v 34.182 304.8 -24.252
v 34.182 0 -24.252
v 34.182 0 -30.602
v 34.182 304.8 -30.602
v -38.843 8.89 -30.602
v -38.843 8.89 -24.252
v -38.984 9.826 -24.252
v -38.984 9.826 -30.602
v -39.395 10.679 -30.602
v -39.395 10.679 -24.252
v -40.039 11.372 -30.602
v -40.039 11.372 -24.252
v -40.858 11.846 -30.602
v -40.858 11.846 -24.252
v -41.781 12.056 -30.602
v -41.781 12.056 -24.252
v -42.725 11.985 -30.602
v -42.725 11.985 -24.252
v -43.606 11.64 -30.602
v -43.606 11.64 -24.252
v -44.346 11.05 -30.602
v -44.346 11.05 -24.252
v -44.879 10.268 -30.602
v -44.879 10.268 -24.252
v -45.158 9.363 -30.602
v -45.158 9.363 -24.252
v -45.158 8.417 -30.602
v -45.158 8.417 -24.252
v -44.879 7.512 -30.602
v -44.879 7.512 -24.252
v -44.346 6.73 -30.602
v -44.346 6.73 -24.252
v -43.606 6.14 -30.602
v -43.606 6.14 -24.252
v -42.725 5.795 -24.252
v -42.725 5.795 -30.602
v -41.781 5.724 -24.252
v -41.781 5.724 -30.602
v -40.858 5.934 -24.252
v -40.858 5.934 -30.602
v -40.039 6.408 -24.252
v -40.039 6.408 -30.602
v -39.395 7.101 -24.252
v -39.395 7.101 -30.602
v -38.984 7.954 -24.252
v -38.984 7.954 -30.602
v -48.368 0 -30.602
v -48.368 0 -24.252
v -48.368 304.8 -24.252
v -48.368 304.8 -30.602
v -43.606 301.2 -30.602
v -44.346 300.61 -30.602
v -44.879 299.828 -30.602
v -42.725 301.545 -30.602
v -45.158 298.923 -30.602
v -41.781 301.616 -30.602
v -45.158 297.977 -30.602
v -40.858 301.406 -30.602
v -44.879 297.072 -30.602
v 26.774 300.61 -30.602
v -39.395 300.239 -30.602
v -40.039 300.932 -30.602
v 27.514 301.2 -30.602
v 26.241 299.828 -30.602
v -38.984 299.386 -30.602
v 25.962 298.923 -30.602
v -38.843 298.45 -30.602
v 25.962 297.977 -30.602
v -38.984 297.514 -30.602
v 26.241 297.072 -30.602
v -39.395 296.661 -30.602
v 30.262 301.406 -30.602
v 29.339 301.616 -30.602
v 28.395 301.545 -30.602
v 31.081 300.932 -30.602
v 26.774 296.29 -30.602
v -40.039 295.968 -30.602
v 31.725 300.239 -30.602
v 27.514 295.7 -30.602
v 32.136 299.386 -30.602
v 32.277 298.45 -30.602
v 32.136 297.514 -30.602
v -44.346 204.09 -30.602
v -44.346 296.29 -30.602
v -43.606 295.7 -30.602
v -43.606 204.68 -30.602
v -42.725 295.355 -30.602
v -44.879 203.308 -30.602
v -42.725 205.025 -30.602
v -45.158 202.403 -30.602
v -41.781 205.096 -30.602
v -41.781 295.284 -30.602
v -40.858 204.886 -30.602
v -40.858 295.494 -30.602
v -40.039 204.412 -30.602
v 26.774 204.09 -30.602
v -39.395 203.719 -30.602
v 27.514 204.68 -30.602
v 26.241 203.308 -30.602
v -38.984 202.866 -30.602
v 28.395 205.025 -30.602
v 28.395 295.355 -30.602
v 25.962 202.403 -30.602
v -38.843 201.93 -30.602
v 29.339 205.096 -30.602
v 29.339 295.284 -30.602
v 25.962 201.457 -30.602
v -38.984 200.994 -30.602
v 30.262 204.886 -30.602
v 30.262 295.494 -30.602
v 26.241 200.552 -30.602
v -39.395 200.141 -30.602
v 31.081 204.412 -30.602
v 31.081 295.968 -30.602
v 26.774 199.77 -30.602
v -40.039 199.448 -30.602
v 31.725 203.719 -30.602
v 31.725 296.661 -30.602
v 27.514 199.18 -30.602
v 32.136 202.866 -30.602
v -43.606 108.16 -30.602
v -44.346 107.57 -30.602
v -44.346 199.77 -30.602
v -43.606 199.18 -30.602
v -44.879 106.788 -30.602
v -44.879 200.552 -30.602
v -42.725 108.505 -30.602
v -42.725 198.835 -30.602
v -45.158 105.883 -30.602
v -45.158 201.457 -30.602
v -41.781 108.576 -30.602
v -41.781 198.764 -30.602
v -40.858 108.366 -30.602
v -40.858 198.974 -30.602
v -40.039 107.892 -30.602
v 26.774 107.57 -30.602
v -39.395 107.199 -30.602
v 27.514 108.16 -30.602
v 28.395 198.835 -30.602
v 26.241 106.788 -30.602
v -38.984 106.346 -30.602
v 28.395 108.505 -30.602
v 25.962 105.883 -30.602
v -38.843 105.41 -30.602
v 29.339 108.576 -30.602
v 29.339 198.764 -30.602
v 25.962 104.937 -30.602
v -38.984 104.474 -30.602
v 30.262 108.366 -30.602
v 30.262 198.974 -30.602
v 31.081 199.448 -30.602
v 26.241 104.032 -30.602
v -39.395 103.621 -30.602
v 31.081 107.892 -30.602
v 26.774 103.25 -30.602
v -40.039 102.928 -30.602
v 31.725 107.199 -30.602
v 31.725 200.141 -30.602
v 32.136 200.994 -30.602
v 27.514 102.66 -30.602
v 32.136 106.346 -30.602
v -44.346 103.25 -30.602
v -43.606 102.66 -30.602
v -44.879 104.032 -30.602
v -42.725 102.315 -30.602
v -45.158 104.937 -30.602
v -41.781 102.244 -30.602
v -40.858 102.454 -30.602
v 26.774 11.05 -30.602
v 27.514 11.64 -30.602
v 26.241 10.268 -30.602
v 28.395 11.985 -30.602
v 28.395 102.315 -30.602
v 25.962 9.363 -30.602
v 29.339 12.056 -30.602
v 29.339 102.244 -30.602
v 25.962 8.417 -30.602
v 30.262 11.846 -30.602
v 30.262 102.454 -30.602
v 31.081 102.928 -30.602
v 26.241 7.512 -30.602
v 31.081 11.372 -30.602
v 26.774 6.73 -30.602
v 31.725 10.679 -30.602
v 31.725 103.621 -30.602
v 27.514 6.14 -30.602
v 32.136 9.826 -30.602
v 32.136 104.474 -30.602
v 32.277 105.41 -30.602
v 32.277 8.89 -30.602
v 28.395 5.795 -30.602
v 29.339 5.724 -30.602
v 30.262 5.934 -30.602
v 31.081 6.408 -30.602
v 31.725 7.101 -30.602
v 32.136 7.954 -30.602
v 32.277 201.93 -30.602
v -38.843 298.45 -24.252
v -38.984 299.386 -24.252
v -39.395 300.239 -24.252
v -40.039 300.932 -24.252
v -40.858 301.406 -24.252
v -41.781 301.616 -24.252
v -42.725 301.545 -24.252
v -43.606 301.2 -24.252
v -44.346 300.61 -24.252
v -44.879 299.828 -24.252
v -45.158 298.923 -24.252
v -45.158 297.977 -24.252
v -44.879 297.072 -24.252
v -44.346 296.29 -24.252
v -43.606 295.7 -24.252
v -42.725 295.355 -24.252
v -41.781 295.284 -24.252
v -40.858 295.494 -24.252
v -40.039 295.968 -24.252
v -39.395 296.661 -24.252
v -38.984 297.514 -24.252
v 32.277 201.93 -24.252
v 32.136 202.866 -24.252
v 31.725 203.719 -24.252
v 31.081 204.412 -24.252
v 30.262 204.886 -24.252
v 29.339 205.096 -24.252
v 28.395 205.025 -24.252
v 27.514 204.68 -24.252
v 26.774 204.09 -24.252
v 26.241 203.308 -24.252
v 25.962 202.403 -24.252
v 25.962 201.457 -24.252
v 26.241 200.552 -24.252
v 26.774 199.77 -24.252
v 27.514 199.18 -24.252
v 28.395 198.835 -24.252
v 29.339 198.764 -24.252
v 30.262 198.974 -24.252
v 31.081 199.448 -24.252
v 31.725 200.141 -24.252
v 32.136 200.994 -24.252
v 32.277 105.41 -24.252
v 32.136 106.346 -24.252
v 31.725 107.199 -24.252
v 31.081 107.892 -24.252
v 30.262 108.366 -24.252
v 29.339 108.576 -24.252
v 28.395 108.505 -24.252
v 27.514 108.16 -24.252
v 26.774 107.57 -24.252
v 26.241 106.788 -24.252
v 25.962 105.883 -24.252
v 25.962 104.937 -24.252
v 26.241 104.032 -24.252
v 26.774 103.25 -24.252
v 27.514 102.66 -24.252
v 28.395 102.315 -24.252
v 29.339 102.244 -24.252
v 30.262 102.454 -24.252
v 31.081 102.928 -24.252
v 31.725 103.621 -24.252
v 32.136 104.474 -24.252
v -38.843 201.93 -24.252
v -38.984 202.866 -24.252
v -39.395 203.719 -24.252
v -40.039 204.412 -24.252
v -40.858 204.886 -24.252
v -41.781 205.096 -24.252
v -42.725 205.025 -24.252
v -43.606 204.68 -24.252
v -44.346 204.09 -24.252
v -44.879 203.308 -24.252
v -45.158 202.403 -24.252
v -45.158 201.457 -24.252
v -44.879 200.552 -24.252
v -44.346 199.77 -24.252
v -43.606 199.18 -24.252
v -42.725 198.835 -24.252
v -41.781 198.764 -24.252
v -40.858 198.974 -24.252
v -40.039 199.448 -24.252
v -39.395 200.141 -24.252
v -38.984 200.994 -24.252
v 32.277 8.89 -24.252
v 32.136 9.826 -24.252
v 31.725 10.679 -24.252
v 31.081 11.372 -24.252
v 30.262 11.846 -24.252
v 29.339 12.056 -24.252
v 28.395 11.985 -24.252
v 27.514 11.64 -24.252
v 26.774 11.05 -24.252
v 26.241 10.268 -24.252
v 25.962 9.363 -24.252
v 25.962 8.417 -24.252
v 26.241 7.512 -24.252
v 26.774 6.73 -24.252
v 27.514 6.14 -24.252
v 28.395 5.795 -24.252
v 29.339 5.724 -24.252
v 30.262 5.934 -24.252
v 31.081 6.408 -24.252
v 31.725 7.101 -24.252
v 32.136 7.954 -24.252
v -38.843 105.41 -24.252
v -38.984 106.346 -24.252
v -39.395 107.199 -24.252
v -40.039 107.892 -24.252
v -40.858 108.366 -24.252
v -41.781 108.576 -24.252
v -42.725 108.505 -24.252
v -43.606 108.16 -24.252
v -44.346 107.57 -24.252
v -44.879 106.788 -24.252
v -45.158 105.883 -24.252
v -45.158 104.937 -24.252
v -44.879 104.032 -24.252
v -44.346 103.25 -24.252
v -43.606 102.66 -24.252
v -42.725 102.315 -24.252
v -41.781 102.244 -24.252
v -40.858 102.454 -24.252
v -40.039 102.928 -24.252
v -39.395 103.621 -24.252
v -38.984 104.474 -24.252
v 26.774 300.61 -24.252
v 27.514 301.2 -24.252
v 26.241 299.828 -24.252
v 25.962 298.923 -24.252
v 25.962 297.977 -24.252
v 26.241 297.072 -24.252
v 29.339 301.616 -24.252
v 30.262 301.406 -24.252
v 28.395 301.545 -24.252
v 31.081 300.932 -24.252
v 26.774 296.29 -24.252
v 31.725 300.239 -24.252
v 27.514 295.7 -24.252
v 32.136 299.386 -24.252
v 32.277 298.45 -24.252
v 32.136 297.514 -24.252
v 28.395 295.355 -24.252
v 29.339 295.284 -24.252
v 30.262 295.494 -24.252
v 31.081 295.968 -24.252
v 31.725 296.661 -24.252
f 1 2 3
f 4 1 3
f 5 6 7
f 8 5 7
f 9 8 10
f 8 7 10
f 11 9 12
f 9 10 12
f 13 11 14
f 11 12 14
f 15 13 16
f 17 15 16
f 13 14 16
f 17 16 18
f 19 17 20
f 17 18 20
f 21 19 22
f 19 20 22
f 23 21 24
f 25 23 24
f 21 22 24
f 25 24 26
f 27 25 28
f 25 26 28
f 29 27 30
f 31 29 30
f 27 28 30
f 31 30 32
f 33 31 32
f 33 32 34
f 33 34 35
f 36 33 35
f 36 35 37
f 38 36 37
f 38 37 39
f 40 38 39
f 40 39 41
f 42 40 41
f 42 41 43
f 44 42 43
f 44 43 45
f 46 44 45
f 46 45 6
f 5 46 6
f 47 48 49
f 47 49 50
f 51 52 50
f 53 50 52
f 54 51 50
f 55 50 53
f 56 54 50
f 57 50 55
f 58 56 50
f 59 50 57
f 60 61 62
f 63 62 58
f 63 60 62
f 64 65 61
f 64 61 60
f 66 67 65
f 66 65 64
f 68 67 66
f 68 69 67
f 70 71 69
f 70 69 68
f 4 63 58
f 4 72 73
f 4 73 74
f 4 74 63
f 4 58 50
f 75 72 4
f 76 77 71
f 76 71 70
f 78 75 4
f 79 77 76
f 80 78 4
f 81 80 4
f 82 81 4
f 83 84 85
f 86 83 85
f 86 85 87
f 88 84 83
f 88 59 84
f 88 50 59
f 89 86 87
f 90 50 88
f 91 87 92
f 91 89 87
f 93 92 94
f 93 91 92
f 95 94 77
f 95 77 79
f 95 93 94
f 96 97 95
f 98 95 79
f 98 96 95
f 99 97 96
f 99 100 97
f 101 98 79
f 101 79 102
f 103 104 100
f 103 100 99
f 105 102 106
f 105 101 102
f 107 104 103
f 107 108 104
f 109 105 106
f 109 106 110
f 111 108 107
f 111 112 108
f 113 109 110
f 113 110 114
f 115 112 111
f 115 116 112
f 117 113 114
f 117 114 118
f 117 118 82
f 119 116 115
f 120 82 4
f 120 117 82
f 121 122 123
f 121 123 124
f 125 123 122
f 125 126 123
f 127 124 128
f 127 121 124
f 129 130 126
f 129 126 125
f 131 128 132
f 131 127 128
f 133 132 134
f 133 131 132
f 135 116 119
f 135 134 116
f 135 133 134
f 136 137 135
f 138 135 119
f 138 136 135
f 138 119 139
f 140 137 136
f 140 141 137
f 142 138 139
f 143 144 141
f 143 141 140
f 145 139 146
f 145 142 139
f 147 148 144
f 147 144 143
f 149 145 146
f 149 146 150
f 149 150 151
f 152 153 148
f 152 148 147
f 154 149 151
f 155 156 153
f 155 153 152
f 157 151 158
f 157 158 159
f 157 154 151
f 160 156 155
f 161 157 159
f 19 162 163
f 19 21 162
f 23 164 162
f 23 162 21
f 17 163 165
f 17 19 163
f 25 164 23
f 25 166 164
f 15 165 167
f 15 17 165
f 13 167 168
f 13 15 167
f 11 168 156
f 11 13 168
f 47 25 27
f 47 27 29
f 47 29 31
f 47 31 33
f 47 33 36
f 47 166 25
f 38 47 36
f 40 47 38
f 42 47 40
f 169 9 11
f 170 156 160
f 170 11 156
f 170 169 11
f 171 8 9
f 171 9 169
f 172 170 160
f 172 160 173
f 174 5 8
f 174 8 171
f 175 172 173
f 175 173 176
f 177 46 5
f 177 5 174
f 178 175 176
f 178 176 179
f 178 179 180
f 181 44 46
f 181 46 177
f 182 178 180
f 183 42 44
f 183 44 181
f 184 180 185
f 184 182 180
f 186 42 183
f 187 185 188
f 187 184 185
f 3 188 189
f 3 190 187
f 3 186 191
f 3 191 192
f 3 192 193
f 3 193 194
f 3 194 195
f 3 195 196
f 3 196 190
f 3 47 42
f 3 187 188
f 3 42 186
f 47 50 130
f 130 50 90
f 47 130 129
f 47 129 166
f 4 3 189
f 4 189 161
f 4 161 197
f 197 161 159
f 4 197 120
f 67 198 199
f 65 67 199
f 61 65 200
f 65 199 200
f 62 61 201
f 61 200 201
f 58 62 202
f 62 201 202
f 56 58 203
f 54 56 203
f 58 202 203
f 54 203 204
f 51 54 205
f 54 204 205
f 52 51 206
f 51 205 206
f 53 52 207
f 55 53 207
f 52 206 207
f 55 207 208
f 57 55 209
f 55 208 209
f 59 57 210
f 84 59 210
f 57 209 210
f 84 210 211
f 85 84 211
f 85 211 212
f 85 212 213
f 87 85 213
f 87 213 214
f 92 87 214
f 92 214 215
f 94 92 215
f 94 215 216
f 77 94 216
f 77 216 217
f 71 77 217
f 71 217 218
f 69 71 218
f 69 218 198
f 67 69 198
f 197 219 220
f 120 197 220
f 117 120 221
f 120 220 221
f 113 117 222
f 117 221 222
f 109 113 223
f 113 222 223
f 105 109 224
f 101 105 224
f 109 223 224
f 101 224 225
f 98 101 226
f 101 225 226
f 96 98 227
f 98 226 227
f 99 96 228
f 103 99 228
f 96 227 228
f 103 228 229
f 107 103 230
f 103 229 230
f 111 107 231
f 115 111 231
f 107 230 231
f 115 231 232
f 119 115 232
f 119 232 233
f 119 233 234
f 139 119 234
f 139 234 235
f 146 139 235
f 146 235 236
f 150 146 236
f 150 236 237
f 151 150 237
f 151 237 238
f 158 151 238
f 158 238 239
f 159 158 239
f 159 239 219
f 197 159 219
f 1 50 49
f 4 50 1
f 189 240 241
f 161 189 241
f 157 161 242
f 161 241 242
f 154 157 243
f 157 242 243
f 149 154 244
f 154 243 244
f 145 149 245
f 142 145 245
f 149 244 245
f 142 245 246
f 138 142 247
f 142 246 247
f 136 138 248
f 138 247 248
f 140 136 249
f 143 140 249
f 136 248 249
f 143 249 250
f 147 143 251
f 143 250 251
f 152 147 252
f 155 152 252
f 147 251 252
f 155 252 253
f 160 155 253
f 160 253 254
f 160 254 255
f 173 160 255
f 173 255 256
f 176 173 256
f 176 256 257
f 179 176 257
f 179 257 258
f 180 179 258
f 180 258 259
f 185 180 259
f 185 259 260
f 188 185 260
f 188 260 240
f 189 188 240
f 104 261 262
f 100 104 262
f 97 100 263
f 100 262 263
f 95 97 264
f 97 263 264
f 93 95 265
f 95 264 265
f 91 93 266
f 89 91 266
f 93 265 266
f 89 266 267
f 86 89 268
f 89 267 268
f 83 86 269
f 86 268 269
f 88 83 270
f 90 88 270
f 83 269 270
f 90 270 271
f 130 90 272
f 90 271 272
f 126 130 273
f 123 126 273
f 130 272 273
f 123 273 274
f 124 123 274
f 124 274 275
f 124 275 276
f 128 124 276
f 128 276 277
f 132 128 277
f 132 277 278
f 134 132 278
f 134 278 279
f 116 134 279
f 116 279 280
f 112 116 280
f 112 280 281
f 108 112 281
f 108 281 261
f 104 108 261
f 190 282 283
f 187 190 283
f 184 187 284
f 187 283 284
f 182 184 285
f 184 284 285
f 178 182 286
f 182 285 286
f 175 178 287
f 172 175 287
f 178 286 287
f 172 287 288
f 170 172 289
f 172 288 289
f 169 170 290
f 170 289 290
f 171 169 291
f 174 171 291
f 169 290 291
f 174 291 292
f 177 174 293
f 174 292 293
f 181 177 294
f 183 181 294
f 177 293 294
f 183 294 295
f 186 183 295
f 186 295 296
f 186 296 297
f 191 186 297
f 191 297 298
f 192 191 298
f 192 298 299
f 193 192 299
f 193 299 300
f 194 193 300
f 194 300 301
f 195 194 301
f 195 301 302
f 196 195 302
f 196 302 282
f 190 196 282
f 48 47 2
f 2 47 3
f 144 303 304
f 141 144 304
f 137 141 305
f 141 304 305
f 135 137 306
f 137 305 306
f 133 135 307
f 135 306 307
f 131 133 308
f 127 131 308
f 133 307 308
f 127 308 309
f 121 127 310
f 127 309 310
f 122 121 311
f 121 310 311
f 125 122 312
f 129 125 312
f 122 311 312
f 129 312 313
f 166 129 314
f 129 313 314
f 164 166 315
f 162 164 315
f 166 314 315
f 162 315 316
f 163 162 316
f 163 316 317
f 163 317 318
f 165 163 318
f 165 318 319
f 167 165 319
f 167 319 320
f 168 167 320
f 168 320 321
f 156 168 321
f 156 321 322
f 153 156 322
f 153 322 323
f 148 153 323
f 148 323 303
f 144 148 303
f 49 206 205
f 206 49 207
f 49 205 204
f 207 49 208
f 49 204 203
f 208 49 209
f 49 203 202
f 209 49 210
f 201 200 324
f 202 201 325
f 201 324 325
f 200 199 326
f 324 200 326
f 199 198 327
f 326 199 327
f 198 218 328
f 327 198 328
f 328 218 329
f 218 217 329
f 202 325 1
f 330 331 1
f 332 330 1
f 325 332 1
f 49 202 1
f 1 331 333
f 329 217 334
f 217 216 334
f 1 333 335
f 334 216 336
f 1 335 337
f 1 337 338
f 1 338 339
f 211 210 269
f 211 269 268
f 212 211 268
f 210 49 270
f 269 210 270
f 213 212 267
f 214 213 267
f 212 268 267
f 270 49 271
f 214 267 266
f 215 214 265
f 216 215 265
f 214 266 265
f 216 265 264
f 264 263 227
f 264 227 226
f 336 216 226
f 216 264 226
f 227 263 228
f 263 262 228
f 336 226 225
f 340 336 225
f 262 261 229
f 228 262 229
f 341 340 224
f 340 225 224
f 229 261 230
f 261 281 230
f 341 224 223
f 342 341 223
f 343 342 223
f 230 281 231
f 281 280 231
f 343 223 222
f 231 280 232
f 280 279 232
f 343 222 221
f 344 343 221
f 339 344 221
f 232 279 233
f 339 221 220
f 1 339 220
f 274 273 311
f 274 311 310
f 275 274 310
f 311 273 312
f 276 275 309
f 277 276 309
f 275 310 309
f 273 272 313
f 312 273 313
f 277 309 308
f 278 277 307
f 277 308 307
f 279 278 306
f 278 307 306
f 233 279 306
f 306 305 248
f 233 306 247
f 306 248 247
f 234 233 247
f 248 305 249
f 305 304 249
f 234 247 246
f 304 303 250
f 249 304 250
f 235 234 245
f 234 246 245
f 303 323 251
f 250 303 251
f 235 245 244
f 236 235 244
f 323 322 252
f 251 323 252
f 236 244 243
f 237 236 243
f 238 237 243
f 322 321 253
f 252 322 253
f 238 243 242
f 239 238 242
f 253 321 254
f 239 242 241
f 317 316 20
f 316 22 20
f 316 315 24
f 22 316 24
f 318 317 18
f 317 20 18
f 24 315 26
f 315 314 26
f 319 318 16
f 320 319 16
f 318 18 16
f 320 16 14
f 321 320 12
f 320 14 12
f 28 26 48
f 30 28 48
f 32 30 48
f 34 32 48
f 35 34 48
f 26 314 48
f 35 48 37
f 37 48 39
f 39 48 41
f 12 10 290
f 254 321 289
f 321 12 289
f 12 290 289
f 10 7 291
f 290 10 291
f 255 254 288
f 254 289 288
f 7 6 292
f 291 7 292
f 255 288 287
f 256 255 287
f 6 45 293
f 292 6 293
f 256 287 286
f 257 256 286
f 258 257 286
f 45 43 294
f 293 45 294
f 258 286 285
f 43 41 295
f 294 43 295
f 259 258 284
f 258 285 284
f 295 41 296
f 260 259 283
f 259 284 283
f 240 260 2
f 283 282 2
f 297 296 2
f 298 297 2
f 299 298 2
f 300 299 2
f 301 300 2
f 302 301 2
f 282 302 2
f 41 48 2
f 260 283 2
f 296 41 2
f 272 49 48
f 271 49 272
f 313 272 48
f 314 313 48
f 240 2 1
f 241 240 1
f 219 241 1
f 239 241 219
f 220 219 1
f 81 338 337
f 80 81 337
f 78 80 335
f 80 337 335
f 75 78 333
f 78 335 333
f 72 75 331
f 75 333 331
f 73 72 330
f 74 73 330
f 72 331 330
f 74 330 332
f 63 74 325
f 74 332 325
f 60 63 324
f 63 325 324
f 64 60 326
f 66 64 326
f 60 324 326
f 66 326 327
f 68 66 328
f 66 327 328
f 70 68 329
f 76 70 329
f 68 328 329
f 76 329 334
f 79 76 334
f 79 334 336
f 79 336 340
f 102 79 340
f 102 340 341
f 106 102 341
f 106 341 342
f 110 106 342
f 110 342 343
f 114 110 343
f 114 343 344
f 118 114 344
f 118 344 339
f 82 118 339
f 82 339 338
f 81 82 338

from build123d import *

# Parameters (mm, degrees)
SKETCH1_W                 = 82.55
SKETCH1_H                 = 6.35
BOSS_EXTRUDE1_DEPTH       = 304.8
SKETCH2_R                 = 3.175
CUT_EXTRUDE1_DEPTH        = 152.4
LPATTERN1_COUNT           = 4
LPATTERN1_PITCH           = 96.52
LPATTERN2_COUNT           = 2
LPATTERN2_PITCH           = 71.12
LPATTERN2_COPY_1_SKETCH_R = 3.175
LPATTERN2_COPY_1_DEPTH    = 152.4
LPATTERN2_COPY_2_SKETCH_R = 3.175
LPATTERN2_COPY_2_DEPTH    = 152.4
LPATTERN2_COPY_3_SKETCH_R = 3.175
LPATTERN2_COPY_3_DEPTH    = 152.4


with BuildPart() as part:
    # Sketch1 → Boss-Extrude1 (new body)
    with BuildSketch(Plane(origin=(0, 0, 0), x_dir=(1, 0, 0), z_dir=(0, 1, 0))):
        with Locations((-7.093085106, 27.426595745)):
            Rectangle(SKETCH1_W, SKETCH1_H)
    extrude(amount=BOSS_EXTRUDE1_DEPTH)

    # Sketch2 → Cut-Extrude1 (cut)
    with BuildSketch(Plane.XY.offset(-24.251595745)):
        with Locations((-42.018085106, 298.45)):
            Circle(SKETCH2_R)
    cut_extrude1 = extrude(amount=-CUT_EXTRUDE1_DEPTH, mode=Mode.SUBTRACT)

    # LPattern1: Cut-Extrude1 ×4
    with Locations(*[(0, -i * LPATTERN1_PITCH, 0) for i in range(1, LPATTERN1_COUNT)]):
        add(cut_extrude1, mode=Mode.SUBTRACT)

    # LPattern2: Cut-Extrude1 ×2
    with Locations(*[(i * LPATTERN2_PITCH, 0, 0) for i in range(1, LPATTERN2_COUNT)]):
        add(cut_extrude1, mode=Mode.SUBTRACT)

    # LPattern2 copy 1 sketch → LPattern2 copy 1 (cut)
    with BuildSketch(Plane(origin=(71.12, -96.52, -24.251595745), x_dir=(1, 0, 0), z_dir=(0, 0, 1))):
        with Locations((-42.018085106, 298.45)):
            Circle(LPATTERN2_COPY_1_SKETCH_R)
    extrude(amount=-LPATTERN2_COPY_1_DEPTH, mode=Mode.SUBTRACT)

    # LPattern2 copy 2 sketch → LPattern2 copy 2 (cut)
    with BuildSketch(Plane(origin=(71.12, -193.04, -24.251595745), x_dir=(1, 0, 0), z_dir=(0, 0, 1))):
        with Locations((-42.018085106, 298.45)):
            Circle(LPATTERN2_COPY_2_SKETCH_R)
    extrude(amount=-LPATTERN2_COPY_2_DEPTH, mode=Mode.SUBTRACT)

    # LPattern2 copy 3 sketch → LPattern2 copy 3 (cut)
    with BuildSketch(Plane(origin=(71.12, -289.56, -24.251595745), x_dir=(1, 0, 0), z_dir=(0, 0, 1))):
        with Locations((-42.018085106, 298.45)):
            Circle(LPATTERN2_COPY_3_SKETCH_R)
    extrude(amount=-LPATTERN2_COPY_3_DEPTH, mode=Mode.SUBTRACT)


solid = part.part
